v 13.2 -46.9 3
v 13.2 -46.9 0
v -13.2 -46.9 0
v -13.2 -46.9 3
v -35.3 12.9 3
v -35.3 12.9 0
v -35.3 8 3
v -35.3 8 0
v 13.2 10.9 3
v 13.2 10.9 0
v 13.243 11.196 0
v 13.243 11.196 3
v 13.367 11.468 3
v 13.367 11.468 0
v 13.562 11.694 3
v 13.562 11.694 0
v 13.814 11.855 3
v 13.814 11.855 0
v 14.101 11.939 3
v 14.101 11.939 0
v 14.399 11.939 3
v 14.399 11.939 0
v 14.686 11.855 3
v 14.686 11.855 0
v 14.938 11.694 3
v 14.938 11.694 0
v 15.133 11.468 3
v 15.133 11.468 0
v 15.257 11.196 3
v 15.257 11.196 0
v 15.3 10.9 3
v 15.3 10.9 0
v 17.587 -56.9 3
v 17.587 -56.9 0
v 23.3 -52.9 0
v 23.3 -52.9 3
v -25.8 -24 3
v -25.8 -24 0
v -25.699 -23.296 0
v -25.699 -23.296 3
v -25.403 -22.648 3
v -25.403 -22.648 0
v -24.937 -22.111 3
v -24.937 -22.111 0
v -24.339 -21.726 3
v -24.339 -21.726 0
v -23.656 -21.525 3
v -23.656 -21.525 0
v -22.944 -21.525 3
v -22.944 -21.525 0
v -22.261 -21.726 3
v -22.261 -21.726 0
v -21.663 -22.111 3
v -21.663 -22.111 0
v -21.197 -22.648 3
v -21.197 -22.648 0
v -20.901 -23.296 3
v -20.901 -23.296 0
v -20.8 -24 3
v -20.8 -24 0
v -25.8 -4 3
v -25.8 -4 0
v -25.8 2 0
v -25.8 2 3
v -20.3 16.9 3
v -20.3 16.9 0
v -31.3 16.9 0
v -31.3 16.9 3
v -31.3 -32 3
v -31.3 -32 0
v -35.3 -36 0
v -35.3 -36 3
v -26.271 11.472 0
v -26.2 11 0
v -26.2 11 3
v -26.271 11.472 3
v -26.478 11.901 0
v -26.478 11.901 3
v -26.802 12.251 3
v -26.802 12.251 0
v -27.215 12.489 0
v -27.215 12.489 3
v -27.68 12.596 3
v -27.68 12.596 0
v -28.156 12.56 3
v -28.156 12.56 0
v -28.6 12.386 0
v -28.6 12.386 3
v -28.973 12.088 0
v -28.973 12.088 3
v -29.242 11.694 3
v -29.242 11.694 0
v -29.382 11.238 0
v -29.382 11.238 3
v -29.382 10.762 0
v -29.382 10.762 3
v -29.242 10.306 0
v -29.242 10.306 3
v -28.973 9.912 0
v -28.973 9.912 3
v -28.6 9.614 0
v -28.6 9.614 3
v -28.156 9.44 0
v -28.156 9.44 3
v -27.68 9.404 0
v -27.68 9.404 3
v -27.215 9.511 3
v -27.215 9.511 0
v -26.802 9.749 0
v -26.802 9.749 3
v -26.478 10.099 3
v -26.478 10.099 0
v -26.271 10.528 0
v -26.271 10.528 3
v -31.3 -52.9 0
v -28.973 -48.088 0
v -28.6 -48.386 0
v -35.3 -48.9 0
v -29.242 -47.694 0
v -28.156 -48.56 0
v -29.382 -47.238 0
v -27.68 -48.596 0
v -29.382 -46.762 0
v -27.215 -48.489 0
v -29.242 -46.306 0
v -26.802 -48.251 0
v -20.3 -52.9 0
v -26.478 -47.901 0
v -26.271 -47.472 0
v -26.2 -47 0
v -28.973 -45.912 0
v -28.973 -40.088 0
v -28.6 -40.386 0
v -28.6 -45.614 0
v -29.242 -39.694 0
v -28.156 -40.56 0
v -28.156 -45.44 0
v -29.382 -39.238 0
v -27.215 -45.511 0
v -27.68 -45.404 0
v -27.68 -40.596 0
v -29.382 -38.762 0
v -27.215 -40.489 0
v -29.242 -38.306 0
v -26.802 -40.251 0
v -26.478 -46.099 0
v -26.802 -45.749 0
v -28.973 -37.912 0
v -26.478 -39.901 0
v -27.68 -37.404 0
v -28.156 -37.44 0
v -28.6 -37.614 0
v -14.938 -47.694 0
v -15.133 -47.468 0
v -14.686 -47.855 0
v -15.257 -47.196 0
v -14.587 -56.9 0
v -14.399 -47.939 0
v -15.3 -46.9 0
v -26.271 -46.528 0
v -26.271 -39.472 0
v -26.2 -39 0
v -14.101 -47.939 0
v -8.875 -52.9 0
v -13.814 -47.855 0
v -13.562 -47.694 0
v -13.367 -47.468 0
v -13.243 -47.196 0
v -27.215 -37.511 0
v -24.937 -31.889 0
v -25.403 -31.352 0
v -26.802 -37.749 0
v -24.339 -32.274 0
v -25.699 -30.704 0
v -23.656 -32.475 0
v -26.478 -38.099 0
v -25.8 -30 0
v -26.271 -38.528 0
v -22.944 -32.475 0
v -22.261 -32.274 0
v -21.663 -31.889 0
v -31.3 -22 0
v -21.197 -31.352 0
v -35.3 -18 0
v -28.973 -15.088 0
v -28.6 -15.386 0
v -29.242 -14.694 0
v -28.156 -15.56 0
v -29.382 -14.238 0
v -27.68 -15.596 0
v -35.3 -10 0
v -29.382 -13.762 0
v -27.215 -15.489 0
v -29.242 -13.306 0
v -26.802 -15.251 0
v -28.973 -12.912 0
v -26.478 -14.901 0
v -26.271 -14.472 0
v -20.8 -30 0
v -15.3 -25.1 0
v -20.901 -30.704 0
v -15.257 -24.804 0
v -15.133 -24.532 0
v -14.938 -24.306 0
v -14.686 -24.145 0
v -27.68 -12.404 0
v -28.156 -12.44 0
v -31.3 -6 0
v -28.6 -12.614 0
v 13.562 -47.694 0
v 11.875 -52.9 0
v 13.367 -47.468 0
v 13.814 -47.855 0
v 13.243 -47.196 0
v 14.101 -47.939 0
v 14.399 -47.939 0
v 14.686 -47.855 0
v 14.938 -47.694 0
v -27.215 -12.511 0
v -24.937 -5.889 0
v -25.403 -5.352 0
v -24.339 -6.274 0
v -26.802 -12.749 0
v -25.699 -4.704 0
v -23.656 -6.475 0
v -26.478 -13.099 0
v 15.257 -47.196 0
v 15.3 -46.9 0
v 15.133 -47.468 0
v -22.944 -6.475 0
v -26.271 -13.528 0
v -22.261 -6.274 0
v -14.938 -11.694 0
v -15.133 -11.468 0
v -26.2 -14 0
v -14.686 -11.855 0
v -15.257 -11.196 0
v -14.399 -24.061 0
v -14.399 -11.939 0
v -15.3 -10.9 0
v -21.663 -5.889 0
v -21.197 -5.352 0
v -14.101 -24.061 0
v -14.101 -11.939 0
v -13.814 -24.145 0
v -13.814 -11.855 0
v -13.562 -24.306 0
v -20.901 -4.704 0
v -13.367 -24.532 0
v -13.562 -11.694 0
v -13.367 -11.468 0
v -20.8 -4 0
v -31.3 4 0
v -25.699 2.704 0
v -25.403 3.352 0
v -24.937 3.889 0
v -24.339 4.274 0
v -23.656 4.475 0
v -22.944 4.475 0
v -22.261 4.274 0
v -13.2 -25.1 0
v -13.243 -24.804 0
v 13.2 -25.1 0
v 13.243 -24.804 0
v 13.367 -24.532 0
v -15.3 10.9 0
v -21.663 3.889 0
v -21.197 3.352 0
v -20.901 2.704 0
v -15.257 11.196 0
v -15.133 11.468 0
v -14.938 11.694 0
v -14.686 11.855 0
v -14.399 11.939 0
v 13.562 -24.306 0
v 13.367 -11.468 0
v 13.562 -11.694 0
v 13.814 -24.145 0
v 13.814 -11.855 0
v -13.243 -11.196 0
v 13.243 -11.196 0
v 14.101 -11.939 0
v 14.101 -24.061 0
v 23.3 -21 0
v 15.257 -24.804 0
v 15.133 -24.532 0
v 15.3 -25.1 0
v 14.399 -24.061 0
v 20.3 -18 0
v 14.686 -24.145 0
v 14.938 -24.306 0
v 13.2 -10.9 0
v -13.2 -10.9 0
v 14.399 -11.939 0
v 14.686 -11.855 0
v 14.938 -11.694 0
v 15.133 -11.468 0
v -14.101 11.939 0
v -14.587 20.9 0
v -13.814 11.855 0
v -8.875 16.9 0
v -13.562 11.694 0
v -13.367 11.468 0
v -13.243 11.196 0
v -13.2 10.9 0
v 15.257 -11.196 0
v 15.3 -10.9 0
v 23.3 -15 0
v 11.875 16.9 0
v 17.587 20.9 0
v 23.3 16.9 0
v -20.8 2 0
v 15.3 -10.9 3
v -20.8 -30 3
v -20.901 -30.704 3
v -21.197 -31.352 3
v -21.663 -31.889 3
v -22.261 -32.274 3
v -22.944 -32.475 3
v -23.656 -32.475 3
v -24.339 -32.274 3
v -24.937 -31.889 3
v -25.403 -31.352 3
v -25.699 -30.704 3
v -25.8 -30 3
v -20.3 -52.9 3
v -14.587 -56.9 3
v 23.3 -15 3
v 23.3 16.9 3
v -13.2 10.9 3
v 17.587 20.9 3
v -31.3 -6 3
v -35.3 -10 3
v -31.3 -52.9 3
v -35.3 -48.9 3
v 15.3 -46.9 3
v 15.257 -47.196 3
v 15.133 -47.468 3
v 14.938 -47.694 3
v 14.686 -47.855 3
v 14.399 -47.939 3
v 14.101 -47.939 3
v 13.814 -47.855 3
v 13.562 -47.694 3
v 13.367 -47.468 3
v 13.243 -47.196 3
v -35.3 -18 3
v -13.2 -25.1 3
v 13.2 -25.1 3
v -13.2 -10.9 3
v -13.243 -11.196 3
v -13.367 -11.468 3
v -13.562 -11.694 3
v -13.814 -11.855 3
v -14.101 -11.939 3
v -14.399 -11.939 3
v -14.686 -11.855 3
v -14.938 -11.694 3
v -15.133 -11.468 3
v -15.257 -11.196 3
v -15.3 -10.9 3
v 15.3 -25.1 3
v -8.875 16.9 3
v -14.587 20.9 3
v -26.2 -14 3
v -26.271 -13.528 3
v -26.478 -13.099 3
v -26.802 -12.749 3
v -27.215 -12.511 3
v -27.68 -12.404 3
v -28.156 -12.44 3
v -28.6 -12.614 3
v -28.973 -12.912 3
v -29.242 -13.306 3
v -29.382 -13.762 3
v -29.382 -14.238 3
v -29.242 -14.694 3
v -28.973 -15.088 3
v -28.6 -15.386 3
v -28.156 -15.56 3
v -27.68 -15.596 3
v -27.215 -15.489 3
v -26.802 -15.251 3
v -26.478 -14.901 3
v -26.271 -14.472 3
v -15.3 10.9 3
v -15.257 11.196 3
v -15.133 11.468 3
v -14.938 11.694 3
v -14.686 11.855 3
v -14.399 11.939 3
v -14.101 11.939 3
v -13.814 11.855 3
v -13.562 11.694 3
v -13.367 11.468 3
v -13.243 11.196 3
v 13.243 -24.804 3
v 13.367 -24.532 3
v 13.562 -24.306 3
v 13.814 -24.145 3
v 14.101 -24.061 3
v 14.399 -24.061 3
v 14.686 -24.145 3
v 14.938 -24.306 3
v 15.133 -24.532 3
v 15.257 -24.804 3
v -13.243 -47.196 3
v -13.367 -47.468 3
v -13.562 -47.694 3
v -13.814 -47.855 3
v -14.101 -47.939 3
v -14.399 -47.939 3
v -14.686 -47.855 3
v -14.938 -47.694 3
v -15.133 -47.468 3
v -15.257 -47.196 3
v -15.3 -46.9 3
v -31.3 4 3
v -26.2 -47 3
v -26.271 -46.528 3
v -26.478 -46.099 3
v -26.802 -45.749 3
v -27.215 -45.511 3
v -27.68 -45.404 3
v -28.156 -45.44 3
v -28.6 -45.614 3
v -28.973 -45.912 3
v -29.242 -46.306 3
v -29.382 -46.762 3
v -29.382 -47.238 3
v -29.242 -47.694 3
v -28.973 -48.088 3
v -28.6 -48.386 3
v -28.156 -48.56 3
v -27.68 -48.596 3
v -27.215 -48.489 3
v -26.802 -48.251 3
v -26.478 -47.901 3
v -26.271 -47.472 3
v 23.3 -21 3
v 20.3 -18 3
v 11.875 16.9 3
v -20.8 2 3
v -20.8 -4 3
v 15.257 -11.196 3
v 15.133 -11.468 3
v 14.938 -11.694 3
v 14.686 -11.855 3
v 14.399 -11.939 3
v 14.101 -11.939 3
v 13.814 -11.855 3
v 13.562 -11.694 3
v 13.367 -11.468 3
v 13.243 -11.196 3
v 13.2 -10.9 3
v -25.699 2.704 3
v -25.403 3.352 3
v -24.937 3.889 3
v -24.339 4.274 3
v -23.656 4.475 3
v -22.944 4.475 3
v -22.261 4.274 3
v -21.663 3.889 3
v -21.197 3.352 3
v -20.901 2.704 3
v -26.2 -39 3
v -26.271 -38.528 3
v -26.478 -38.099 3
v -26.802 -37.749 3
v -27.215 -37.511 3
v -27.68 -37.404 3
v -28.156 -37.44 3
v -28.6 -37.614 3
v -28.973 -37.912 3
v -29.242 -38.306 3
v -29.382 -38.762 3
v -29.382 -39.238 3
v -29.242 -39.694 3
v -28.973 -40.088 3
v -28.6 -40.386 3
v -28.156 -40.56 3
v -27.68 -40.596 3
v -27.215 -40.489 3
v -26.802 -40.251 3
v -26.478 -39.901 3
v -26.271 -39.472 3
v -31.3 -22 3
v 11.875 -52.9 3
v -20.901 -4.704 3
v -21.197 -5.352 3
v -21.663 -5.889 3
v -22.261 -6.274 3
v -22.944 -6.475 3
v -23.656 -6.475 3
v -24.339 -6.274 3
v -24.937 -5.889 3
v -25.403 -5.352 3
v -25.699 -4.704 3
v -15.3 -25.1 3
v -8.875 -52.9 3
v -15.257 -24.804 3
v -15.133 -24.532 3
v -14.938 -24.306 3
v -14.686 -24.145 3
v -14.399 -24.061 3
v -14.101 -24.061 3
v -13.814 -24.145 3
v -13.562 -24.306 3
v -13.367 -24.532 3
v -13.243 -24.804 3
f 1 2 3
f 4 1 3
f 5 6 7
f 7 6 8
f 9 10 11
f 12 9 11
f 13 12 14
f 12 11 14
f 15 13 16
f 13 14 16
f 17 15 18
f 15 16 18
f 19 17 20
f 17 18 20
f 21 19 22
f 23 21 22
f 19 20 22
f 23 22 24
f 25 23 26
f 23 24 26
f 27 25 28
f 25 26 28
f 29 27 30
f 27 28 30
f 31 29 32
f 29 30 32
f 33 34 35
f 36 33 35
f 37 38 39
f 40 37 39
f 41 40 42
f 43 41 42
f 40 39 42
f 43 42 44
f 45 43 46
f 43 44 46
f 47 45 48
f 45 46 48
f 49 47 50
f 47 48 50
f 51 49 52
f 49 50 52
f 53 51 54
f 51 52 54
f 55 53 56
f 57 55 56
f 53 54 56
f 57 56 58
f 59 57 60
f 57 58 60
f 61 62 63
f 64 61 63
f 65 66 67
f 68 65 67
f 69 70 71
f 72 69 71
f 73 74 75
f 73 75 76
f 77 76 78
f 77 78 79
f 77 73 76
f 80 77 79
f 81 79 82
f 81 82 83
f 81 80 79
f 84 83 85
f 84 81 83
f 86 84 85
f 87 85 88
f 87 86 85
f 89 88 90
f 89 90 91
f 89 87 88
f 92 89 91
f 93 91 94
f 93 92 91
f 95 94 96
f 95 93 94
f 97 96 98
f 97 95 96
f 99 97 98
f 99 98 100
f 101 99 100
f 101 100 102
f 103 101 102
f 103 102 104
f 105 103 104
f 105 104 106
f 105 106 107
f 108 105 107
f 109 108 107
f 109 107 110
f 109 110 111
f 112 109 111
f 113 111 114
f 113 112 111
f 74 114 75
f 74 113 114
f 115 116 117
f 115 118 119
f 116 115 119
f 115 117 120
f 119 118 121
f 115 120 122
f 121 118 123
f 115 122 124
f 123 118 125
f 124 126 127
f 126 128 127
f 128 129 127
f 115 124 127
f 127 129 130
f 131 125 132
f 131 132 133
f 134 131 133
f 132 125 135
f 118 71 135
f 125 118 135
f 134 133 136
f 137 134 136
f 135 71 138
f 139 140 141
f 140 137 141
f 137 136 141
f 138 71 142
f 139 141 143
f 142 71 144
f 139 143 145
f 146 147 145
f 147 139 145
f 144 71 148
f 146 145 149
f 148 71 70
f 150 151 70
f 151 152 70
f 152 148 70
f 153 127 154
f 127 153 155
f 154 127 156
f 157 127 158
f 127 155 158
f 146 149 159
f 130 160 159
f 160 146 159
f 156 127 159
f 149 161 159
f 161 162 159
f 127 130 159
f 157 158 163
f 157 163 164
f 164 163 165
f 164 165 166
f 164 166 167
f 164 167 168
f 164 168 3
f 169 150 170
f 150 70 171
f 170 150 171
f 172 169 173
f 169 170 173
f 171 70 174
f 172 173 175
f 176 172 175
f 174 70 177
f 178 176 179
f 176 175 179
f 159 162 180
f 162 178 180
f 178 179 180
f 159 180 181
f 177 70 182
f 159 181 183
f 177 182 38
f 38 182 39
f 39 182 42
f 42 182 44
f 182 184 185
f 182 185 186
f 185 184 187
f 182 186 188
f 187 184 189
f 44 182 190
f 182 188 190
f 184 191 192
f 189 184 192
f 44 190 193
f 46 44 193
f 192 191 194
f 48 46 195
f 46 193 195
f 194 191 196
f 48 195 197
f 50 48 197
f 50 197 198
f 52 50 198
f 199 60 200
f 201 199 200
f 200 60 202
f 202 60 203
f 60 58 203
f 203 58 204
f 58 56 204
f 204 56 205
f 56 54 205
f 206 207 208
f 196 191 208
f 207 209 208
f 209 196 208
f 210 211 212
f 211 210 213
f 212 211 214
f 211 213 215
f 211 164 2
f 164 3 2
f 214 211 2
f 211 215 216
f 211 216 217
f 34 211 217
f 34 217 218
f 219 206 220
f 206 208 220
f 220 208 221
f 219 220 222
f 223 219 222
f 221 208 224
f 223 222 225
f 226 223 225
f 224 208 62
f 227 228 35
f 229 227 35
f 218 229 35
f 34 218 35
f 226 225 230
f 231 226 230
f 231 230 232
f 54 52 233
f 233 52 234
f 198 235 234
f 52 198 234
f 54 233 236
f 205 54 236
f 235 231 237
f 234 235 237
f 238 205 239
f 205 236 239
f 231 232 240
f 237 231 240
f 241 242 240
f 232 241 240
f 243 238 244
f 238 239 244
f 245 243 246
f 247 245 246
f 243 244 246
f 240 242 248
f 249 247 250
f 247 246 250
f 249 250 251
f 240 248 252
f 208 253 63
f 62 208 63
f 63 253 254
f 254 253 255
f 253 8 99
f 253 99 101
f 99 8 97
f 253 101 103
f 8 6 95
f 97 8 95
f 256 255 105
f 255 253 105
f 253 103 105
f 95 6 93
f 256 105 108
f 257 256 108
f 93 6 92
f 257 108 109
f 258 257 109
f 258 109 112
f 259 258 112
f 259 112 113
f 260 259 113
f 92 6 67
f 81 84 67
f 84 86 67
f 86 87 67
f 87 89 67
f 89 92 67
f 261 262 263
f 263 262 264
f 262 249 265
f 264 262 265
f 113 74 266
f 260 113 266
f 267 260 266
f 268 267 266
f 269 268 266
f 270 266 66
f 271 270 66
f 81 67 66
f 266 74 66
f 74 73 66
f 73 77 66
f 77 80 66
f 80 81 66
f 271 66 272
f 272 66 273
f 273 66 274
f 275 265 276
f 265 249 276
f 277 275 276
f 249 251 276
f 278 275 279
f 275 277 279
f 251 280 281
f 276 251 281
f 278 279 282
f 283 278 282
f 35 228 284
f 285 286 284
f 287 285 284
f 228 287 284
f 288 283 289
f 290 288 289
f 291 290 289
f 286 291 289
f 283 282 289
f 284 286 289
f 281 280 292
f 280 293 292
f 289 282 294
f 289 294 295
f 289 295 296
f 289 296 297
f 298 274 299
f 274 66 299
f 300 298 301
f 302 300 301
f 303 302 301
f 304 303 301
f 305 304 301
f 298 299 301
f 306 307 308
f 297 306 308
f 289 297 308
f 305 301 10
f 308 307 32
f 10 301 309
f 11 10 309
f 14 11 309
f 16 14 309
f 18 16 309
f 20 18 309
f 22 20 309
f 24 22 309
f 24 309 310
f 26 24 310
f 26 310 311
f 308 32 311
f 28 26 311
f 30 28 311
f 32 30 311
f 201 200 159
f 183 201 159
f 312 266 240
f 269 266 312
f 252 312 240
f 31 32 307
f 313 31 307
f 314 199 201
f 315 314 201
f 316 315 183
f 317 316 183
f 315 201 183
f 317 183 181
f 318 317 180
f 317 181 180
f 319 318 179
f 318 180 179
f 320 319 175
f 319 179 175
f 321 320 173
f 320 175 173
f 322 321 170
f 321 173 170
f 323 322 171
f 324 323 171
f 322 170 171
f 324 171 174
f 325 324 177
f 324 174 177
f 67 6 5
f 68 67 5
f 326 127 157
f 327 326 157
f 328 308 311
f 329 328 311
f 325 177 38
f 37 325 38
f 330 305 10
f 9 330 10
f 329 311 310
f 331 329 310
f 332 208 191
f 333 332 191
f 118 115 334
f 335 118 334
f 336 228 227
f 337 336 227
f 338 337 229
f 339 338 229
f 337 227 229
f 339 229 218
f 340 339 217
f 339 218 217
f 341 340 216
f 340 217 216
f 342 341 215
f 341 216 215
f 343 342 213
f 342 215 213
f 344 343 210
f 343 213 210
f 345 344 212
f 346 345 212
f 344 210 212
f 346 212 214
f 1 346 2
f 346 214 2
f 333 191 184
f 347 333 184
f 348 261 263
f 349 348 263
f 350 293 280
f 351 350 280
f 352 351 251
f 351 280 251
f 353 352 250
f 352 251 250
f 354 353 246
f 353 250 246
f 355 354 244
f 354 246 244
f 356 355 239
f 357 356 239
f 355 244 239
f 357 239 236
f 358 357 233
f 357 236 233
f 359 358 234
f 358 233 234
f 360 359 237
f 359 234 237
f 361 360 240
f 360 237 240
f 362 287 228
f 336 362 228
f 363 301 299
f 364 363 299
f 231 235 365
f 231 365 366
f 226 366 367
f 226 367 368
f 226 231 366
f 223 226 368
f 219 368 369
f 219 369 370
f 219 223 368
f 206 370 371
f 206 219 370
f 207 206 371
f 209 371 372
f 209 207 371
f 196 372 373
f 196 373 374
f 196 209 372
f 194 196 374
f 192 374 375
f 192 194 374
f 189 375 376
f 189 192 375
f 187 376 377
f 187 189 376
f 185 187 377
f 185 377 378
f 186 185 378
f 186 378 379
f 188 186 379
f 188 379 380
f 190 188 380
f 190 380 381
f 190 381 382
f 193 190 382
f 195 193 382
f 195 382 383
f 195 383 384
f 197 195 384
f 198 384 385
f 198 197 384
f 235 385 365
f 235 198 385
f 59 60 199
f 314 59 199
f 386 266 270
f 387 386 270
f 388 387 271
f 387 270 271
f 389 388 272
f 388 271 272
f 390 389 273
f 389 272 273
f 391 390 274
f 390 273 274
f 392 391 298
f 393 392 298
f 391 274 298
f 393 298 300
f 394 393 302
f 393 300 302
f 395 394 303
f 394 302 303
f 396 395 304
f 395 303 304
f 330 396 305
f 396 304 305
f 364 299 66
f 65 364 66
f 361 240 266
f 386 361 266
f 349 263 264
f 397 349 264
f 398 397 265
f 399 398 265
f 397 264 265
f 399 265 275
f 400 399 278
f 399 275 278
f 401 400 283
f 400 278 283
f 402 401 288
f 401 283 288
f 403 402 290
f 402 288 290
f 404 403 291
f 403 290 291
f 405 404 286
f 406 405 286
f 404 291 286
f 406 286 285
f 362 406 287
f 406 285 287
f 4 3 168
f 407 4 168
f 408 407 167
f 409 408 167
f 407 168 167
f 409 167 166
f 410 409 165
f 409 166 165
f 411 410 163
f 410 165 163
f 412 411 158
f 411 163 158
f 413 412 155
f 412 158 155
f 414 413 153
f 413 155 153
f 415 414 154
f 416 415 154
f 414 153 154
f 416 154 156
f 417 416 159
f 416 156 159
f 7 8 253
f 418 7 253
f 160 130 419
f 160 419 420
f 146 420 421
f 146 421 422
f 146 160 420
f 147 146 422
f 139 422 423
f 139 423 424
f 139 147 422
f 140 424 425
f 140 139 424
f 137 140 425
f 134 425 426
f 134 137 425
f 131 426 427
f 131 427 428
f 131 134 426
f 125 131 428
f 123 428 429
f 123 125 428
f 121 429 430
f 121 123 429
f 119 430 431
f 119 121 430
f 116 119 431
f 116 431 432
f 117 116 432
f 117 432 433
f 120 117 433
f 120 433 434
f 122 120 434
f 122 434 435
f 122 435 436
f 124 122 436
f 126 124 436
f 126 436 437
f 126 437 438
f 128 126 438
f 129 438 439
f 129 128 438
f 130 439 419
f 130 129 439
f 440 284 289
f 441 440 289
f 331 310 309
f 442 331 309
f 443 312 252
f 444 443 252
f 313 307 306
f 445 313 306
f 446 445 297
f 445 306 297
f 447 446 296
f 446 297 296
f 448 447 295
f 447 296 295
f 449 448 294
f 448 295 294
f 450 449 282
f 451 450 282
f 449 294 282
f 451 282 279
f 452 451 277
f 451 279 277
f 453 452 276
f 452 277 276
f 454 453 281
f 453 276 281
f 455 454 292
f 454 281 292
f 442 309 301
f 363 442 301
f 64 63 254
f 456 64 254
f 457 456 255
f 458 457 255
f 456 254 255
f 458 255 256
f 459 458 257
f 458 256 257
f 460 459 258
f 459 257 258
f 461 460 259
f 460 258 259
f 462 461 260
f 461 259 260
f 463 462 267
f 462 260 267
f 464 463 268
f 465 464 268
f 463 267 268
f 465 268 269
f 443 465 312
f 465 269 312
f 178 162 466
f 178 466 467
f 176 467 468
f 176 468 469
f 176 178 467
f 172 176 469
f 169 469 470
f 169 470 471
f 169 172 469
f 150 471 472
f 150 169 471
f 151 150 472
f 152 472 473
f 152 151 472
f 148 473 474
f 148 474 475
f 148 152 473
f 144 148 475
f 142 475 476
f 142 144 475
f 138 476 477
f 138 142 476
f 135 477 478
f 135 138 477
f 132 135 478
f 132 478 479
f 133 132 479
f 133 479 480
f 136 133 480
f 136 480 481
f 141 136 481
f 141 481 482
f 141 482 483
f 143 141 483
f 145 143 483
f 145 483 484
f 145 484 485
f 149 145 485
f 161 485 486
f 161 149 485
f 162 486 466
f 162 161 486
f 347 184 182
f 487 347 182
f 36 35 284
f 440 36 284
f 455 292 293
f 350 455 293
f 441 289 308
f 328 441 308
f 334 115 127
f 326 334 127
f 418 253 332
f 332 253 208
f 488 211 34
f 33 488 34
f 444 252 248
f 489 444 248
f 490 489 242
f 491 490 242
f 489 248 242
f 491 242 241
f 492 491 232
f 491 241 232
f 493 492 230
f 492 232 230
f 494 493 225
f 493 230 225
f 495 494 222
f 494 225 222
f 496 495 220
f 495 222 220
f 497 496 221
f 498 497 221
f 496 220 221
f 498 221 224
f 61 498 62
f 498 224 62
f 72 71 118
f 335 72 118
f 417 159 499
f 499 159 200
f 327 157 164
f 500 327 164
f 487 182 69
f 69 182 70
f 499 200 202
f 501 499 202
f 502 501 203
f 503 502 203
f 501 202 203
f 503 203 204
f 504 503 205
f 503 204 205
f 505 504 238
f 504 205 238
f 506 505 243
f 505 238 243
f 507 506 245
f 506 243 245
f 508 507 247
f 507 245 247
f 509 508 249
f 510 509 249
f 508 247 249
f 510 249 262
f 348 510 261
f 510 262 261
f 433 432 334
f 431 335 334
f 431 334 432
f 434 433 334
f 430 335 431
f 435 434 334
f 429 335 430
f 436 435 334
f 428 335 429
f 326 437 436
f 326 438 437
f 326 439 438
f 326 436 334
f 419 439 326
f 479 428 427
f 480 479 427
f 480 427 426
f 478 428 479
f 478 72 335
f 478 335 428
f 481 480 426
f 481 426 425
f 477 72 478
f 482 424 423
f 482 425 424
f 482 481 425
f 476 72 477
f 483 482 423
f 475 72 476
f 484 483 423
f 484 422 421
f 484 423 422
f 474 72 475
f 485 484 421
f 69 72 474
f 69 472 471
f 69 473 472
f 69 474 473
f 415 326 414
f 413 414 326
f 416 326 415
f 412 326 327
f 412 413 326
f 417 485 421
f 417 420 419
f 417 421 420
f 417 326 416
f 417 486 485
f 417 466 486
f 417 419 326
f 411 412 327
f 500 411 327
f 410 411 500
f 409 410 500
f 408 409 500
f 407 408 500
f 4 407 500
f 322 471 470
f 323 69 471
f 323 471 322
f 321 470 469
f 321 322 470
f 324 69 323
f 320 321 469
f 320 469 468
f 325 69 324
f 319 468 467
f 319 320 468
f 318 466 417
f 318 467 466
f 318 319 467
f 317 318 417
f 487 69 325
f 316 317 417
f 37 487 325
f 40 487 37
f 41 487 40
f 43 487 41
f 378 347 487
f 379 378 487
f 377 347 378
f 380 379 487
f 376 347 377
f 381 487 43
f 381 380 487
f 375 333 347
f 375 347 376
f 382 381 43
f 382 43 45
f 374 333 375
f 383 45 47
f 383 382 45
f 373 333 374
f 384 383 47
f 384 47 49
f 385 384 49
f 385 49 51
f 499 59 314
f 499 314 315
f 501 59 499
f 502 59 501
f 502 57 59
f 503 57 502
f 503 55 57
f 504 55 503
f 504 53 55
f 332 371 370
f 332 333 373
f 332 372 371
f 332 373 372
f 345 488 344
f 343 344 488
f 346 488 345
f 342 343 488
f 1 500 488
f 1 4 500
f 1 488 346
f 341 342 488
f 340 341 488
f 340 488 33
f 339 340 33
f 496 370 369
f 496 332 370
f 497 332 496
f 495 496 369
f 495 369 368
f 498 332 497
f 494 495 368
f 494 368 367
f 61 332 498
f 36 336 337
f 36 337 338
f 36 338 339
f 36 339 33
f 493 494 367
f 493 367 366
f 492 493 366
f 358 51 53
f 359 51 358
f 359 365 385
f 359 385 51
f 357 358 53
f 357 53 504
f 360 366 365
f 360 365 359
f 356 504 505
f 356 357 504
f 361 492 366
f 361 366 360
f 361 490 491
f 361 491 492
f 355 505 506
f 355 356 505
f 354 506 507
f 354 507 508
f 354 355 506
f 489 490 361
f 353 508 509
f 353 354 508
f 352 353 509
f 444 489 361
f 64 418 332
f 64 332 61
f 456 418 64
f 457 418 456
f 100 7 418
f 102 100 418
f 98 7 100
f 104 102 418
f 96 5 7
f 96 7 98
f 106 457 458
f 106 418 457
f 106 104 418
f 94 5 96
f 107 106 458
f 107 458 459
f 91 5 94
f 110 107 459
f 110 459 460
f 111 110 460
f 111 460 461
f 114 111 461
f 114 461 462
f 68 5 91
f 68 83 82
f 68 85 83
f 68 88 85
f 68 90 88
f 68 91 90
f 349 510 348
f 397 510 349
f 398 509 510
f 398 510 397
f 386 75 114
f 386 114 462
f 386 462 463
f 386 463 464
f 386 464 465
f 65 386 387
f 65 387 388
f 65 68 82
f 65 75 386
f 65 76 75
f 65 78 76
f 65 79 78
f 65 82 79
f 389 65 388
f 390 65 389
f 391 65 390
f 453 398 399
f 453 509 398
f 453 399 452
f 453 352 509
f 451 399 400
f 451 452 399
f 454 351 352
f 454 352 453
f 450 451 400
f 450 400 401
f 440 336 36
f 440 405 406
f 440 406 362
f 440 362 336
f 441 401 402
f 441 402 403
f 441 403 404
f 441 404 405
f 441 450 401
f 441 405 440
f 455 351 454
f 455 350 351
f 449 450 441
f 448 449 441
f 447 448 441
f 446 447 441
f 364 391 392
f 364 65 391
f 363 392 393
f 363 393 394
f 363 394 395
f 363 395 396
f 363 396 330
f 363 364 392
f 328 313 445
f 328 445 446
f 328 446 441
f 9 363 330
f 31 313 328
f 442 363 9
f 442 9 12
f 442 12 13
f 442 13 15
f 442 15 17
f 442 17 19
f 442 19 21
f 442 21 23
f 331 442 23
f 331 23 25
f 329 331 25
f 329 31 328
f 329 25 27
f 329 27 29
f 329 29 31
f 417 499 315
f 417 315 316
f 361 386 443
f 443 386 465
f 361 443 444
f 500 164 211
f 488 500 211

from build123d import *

# Parameters (mm, degrees)
SKETCH_1_R      = 1.6
EXTRUDE_1_DEPTH = 3
CHAMFER_1_SIZE  = 4


with BuildPart() as part:
    # 草图1 → 凸台-拉伸1 (new body)
    with BuildSketch(Plane.XY):
        Polygon((-20.3, 16.9), (-35.3, 16.9), (-35.3, 8), (-31.3, 4), (-31.3, -6), (-35.3, -10), (-35.3, -18), (-31.3, -22), (-31.3, -32), (-35.3, -36), (-35.3, -52.9), (-20.3, -52.9), (-14.587407973, -56.9), (-8.874815946, -52.9), (11.874815946, -52.9), (17.587407973, -56.9), (23.3, -52.9), (23.3, -21), (20.3, -18), (23.3, -15), (23.3, 16.9), (17.587407973, 20.9), (11.874815946, 16.9), (-8.874815946, 16.9), (-14.587407973, 20.9), align=None)
        with Locations((-27.8, -47)):
            Circle(SKETCH_1_R, mode=Mode.SUBTRACT)
        with Locations((-27.8, -39)):
            Circle(SKETCH_1_R, mode=Mode.SUBTRACT)
        with BuildLine():
            ThreePointArc((-20.8, -30), (-23.3, -32.5), (-25.8, -30))
            Line((-25.8, -30), (-25.8, -24))
            ThreePointArc((-25.8, -24), (-23.3, -21.5), (-20.8, -24))
            Line((-20.8, -24), (-20.8, -30))
        make_face(mode=Mode.SUBTRACT)
        with BuildLine():
            Line((13.2, -46.9), (-13.2, -46.9))
            ThreePointArc((-13.2, -46.9), (-14.25, -47.95), (-15.3, -46.9))
            Line((-15.3, -46.9), (-15.3, -25.1))
            ThreePointArc((-15.3, -25.1), (-14.25, -24.05), (-13.2, -25.1))
            Line((-13.2, -25.1), (13.2, -25.1))
            ThreePointArc((13.2, -25.1), (14.25, -24.05), (15.3, -25.1))
            Line((15.3, -25.1), (15.3, -46.9))
            ThreePointArc((15.3, -46.9), (14.25, -47.95), (13.2, -46.9))
        make_face(mode=Mode.SUBTRACT)
        with Locations((-27.8, -14)):
            Circle(SKETCH_1_R, mode=Mode.SUBTRACT)
        with BuildLine():
            Line((-25.8, -4), (-25.8, 2))
            ThreePointArc((-25.8, 2), (-23.3, 4.5), (-20.8, 2))
            Line((-20.8, 2), (-20.8, -4))
            ThreePointArc((-20.8, -4), (-23.3, -6.5), (-25.8, -4))
        make_face(mode=Mode.SUBTRACT)
        with Locations((-27.8, 11)):
            Circle(SKETCH_1_R, mode=Mode.SUBTRACT)
        with BuildLine():
            Line((13.2, -10.9), (-13.2, -10.9))
            ThreePointArc((-13.2, -10.9), (-14.25, -11.95), (-15.3, -10.9))
            Line((-15.3, -10.9), (-15.3, 10.9))
            ThreePointArc((-15.3, 10.9), (-14.25, 11.95), (-13.2, 10.9))
            Line((-13.2, 10.9), (13.2, 10.9))
            ThreePointArc((13.2, 10.9), (14.25, 11.95), (15.3, 10.9))
            Line((15.3, 10.9), (15.3, -10.9))
            ThreePointArc((15.3, -10.9), (14.25, -11.95), (13.2, -10.9))
        make_face(mode=Mode.SUBTRACT)
    extrude(amount=EXTRUDE_1_DEPTH)

    # 倒角1
    chamfer_1_edges = [part.edges().sort_by_distance(p)[0] for p in [
        (-35.3, 16.9, 1.5),
        (-35.3, -52.9, 1.5),
    ]]
    chamfer(chamfer_1_edges, length=CHAMFER_1_SIZE)


solid = part.part
